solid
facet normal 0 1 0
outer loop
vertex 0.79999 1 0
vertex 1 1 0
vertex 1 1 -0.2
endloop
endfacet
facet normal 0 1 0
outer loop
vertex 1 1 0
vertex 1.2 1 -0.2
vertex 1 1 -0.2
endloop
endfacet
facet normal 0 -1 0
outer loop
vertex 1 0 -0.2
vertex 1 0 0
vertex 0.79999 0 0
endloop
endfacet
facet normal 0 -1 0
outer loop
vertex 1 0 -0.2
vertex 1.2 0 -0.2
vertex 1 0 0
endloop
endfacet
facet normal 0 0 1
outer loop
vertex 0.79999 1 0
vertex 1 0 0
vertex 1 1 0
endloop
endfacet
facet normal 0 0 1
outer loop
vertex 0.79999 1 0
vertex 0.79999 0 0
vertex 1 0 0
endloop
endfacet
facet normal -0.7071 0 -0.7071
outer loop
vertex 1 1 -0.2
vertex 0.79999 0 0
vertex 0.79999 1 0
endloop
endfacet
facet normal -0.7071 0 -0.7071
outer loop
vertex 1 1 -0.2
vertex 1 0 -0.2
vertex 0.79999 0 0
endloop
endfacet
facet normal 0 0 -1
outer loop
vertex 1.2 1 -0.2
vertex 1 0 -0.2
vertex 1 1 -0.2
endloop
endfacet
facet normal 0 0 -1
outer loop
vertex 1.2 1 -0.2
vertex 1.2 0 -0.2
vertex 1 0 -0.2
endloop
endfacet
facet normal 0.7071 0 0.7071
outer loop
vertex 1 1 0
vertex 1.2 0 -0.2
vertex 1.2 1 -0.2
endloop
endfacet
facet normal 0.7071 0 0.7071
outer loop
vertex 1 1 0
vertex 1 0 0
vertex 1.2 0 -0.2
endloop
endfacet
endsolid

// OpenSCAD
translate([0,1,0])
rotate([90,0,0])
linear_extrude(1.0) {
    polygon([[.8,0], [1, 0], [1.2,-.2], [1, -.2], [.8, 0]]);
};
